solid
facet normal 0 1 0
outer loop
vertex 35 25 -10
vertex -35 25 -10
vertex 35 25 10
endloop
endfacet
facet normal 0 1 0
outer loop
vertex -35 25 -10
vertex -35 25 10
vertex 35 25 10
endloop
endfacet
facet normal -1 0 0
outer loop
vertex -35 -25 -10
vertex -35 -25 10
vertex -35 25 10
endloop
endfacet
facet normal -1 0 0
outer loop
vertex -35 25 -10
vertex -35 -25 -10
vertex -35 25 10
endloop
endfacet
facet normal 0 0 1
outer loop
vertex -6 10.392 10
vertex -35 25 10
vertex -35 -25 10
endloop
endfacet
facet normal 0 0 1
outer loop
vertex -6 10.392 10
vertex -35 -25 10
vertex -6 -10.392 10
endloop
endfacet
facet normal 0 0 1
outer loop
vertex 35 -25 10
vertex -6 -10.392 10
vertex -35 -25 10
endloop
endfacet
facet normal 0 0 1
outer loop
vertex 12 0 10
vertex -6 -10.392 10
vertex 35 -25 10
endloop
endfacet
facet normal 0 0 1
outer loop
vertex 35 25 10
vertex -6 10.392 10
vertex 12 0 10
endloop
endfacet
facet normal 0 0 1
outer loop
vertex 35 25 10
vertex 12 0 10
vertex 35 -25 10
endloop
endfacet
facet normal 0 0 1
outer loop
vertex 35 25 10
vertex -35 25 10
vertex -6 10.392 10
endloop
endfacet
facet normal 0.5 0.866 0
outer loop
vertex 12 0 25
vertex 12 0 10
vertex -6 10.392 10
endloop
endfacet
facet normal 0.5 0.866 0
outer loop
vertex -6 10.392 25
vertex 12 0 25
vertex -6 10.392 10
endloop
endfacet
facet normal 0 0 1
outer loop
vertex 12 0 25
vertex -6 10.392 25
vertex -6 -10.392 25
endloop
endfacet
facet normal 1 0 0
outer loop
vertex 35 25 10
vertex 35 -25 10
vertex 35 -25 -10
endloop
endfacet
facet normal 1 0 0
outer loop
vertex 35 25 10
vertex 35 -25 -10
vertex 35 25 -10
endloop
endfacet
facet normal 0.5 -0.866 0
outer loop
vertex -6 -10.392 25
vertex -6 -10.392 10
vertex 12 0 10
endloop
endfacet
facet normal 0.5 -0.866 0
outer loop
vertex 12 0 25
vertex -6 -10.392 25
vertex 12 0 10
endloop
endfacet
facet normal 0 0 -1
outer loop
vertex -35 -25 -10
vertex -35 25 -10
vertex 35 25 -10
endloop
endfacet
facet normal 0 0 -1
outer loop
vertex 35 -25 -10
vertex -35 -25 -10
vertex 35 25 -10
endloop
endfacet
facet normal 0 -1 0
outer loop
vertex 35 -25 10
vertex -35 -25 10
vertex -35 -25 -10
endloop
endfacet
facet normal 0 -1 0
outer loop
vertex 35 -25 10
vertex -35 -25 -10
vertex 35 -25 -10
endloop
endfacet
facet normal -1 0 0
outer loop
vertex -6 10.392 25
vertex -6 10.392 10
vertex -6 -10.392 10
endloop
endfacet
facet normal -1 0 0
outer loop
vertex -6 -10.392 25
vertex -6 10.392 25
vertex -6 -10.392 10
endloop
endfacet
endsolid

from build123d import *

# Parameters (mm, degrees)
SKETCH_1_W      = 70
SKETCH_1_H      = 50
EXTRUDE_1_DEPTH = 10
EXTRUDE_2_DEPTH = 15


with BuildPart() as part:
    # 草图1 → 凸台-拉伸1 (new, symmetric)
    with BuildSketch(Plane.XY):
        Rectangle(SKETCH_1_W, SKETCH_1_H)
    extrude(amount=EXTRUDE_1_DEPTH, both=True)

    # 草图2 → 凸台-拉伸2 (add)
    with BuildSketch(Plane.XY.offset(10)):
        Polygon((12, 0), (-6, 10.392304845), (-6, -10.392304845), align=None)
    extrude(amount=EXTRUDE_2_DEPTH)


solid = part.part
